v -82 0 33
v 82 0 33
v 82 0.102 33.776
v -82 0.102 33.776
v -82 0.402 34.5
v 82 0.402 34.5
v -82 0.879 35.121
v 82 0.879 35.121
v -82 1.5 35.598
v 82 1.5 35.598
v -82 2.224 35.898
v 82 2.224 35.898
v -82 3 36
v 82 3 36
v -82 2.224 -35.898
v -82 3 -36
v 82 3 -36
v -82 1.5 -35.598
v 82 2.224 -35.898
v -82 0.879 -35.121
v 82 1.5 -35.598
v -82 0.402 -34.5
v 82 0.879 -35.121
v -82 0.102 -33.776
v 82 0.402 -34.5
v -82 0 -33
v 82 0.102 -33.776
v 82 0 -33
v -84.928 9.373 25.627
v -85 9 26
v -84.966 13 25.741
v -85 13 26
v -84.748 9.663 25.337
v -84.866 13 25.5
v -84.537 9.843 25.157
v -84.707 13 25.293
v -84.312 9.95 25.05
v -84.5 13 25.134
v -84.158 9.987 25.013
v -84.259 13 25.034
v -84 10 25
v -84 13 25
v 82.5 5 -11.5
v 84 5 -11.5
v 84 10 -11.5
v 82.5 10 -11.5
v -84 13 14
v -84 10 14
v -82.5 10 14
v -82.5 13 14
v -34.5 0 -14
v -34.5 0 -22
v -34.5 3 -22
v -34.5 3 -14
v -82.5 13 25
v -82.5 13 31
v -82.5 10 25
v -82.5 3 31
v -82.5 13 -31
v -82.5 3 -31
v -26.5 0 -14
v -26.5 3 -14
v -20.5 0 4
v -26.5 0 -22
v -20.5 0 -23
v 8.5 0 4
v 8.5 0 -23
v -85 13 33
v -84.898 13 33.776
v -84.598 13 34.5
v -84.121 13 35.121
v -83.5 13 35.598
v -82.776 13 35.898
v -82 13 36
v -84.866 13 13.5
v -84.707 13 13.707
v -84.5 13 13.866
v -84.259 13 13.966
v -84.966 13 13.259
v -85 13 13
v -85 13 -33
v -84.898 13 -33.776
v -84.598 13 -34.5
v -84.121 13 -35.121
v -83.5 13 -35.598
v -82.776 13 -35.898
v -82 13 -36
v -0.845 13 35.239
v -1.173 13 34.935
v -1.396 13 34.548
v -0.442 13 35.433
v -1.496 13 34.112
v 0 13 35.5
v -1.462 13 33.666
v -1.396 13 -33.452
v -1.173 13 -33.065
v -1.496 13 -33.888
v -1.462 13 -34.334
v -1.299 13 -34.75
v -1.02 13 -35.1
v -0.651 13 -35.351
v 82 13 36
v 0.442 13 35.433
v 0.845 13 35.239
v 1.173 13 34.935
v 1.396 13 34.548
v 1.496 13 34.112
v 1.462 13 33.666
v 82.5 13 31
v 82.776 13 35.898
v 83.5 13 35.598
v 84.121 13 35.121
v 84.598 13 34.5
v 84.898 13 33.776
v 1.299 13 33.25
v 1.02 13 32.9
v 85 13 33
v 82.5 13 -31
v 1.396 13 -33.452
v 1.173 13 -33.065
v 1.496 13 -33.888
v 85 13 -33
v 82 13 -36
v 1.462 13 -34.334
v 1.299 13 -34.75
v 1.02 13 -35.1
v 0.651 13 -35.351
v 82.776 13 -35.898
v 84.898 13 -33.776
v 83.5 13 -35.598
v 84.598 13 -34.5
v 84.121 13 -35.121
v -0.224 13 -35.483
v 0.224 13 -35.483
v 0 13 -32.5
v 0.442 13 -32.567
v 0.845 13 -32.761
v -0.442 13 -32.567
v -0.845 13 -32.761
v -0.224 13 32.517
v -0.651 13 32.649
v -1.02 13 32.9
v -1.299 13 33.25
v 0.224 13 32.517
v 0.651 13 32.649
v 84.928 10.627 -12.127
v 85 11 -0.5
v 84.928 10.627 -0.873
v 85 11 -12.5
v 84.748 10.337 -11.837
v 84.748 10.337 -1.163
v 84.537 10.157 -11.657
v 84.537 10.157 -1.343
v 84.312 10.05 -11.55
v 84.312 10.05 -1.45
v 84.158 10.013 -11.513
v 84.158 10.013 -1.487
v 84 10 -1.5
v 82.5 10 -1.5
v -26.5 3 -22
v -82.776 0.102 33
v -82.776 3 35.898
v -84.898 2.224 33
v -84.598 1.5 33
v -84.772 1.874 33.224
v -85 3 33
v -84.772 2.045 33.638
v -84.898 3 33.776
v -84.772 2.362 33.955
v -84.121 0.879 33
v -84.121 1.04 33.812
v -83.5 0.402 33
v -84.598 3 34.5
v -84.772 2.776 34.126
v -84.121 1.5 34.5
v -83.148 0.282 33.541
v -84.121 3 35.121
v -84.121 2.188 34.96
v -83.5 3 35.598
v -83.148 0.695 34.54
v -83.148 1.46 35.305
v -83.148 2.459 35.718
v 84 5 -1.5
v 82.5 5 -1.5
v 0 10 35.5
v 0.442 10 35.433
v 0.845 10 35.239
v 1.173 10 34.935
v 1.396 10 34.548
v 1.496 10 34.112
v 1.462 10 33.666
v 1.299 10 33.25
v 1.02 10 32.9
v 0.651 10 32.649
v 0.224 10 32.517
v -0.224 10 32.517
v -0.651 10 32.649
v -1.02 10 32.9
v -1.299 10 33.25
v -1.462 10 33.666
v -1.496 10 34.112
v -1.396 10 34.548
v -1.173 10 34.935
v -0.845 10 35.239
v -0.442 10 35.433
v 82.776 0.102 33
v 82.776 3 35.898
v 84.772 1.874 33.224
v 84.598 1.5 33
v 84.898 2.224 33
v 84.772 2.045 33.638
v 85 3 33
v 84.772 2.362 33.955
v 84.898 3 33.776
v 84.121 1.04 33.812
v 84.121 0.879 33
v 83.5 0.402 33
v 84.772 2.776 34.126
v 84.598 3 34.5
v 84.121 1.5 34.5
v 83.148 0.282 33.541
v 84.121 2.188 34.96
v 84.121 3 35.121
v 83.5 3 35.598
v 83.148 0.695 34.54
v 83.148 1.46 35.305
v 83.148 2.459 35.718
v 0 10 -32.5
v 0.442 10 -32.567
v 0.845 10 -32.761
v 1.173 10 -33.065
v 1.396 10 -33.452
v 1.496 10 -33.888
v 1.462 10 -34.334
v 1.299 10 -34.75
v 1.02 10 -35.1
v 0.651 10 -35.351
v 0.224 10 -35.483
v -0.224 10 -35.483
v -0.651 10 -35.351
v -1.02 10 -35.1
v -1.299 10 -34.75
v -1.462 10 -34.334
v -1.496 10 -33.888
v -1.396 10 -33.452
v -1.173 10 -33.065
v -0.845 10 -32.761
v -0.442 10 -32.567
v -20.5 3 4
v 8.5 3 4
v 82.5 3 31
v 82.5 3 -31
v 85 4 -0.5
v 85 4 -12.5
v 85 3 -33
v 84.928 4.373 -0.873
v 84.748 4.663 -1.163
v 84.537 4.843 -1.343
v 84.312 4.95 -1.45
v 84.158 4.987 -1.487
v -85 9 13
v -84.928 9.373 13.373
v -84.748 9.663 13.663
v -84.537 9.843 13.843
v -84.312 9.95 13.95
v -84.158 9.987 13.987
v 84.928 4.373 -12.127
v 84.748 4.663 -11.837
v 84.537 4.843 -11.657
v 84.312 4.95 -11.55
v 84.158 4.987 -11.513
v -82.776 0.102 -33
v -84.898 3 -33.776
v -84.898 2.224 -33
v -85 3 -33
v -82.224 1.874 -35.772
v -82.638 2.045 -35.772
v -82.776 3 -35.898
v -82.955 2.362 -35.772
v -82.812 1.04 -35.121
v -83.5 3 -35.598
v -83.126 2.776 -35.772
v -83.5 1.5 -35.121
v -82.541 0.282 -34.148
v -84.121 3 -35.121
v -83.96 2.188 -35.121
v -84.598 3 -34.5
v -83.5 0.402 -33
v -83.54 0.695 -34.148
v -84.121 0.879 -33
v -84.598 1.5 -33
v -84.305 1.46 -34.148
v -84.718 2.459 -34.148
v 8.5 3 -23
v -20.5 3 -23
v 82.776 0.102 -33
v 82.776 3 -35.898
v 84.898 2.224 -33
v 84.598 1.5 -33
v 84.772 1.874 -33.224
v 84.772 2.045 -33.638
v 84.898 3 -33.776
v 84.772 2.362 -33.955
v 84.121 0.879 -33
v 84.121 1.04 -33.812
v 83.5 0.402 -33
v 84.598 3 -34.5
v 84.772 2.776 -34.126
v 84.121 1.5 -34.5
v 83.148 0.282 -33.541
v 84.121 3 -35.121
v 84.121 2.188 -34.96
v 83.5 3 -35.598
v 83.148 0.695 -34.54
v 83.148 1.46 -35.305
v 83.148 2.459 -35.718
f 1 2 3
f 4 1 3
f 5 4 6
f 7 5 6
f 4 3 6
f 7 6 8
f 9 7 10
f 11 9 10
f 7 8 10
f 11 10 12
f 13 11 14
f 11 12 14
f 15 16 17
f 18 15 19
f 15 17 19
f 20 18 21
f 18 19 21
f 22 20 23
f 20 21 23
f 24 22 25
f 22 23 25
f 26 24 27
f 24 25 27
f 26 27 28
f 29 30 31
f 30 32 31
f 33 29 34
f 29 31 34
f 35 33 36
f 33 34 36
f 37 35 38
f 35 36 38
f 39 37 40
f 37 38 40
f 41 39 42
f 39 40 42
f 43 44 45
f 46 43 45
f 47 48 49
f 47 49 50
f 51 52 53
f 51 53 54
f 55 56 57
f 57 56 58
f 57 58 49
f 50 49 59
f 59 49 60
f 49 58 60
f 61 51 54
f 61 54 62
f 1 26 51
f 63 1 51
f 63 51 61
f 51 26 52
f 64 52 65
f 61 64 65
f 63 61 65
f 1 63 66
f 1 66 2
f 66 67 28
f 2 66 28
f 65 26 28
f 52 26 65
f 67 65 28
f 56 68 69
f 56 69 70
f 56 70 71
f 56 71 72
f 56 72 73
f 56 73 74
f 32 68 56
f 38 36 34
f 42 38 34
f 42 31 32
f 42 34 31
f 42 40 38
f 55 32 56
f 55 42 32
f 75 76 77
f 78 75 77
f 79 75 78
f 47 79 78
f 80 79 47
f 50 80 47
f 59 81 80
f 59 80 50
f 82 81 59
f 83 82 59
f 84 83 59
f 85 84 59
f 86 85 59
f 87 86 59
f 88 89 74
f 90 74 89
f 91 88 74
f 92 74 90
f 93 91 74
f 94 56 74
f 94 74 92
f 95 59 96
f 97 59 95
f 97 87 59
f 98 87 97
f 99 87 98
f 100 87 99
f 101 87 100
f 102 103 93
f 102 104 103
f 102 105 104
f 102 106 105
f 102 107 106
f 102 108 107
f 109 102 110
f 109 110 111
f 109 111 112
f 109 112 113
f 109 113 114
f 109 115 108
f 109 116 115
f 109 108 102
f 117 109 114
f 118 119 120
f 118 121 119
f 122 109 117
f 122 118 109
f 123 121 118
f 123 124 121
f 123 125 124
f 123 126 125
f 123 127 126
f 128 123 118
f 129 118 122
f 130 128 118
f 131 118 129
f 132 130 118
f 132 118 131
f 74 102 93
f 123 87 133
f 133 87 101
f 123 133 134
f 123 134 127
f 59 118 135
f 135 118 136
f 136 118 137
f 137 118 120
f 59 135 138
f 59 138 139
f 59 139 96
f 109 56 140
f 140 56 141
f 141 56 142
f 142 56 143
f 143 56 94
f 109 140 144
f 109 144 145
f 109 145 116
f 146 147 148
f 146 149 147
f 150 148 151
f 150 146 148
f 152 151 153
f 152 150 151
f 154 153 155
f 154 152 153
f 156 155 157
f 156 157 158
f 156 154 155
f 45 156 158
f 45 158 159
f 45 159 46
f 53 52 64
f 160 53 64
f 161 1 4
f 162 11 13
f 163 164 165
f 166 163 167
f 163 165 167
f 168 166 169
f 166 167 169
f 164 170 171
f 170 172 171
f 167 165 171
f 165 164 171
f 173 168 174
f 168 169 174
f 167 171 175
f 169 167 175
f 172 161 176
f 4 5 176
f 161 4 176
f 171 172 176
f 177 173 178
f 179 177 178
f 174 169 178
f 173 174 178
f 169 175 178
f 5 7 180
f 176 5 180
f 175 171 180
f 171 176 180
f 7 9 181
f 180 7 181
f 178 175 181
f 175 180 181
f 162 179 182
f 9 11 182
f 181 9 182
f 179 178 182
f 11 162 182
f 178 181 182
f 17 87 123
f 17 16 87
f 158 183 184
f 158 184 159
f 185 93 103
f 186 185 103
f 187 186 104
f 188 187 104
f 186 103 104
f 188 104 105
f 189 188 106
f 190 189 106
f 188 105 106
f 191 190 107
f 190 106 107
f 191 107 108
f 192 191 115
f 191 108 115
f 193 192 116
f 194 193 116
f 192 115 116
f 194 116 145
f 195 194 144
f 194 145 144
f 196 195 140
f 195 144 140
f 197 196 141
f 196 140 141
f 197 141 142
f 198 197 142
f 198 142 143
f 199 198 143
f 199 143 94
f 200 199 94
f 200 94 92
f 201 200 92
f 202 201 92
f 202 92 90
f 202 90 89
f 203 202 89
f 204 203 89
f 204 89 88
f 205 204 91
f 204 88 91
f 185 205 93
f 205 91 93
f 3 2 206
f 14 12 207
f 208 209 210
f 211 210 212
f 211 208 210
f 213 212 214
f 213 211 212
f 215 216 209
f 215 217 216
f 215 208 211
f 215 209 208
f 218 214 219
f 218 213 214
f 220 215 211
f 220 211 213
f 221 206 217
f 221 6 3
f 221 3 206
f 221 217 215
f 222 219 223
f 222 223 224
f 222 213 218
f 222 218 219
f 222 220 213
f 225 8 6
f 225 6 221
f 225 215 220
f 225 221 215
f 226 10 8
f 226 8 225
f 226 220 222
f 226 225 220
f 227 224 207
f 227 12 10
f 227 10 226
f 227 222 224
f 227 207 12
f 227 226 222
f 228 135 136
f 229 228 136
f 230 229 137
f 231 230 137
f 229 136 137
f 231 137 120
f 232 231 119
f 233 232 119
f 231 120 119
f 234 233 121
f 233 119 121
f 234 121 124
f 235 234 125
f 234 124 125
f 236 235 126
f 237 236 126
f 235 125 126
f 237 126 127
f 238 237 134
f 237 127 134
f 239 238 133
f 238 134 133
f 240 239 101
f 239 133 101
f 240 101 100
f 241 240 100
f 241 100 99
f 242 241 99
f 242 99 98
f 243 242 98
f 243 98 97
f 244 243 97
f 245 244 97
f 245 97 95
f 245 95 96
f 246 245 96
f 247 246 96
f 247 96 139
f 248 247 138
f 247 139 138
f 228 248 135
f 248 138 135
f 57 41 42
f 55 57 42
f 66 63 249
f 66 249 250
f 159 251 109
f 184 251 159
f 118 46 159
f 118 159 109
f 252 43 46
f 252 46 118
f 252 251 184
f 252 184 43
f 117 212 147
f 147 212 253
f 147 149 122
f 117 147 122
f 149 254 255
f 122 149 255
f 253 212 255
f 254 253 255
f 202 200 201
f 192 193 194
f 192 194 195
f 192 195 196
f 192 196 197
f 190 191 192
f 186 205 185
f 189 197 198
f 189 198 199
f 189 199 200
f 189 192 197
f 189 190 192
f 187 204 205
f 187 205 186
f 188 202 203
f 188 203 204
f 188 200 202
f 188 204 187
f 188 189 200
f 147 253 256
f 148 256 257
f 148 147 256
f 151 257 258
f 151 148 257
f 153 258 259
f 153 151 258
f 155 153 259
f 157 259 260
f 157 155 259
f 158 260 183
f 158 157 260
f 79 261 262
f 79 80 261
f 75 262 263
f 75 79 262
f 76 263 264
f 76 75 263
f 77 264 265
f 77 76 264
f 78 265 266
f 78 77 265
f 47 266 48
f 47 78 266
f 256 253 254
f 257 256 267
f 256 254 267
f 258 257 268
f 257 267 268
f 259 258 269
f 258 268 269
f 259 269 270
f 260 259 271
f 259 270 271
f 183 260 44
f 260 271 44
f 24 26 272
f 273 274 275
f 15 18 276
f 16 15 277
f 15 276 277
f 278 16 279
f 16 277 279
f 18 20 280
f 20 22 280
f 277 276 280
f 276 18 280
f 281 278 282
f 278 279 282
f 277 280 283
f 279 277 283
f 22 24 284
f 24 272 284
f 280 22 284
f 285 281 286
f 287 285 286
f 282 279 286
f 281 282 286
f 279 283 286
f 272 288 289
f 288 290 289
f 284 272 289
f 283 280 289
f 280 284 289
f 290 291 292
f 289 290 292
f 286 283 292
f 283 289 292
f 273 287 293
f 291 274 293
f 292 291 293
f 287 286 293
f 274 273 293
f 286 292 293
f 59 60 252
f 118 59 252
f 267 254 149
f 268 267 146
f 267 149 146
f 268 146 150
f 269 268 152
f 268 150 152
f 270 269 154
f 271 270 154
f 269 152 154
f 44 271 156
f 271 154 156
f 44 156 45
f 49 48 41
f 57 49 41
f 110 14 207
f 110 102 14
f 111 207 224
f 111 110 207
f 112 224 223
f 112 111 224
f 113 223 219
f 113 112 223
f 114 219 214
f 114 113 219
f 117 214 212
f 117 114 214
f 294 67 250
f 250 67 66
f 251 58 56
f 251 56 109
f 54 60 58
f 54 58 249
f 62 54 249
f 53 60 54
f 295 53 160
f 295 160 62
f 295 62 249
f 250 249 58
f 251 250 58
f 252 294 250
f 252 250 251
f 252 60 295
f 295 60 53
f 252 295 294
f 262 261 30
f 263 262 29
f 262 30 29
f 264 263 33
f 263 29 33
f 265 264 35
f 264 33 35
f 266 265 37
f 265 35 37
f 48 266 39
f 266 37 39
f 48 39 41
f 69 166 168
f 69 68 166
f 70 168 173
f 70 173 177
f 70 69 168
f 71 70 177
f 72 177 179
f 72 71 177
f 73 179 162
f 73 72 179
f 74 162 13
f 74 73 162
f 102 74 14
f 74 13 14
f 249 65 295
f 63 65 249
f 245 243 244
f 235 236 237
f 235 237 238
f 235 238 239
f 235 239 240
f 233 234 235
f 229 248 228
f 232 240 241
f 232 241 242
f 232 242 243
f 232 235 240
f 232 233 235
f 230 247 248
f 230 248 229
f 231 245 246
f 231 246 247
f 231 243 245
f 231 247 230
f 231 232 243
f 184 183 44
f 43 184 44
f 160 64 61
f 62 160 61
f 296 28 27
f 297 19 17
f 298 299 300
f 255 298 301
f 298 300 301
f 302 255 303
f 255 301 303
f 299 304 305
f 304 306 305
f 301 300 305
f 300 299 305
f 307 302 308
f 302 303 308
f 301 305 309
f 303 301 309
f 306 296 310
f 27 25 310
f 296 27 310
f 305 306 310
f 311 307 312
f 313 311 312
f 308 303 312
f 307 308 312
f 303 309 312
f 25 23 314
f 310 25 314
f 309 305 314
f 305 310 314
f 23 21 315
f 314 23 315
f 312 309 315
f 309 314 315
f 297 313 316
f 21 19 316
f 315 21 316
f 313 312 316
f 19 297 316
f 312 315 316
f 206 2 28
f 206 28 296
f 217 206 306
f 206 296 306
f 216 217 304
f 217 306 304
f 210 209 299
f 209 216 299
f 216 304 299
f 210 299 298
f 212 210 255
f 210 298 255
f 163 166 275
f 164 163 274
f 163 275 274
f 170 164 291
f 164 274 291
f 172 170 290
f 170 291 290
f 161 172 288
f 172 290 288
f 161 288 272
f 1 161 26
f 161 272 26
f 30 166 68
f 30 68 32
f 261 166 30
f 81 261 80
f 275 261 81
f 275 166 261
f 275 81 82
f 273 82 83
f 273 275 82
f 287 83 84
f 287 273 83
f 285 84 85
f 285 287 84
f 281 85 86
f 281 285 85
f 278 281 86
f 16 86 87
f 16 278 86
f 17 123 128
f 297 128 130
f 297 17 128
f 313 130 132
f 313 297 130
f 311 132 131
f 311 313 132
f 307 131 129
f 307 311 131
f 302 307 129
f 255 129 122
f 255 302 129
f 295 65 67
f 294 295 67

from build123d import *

# Parameters (mm, degrees)
SKETCH_1_W          = 170
SKETCH_1_H          = 72
EXTRUDE_1_DEPTH     = 3
SKETCH_2_W          = 170
SKETCH_2_H          = 72
SKETCH_2_W_2        = 165
SKETCH_2_H_2        = 62
EXTRUDE_2_DEPTH     = 10
SKETCH_3_R          = 1.5
CUT_EXTRUDE_1_DEPTH = 3
SKETCH_4_W          = 29
SKETCH_4_H          = 27
SKETCH_4_W_2        = 8
SKETCH_4_H_2        = 8
CUT_EXTRUDE_2_DEPTH = 3
FILLET_1_R          = 3
SKETCH_5_W          = 11
SKETCH_5_H          = 3
CUT_EXTRUDE_3_DEPTH = 3
FILLET_3_R          = 1
SKETCH_6_W          = 10
SKETCH_6_H          = 5
CUT_EXTRUDE_4_DEPTH = 3
FILLET_4_R          = 1


with BuildPart() as part:
    # 草图1 → 凸台-拉伸1 (new body)
    with BuildSketch(Plane(origin=(0, 0, 0), x_dir=(1, 0, 0), z_dir=(0, 1, 0))):
        Rectangle(SKETCH_1_W, SKETCH_1_H)
    extrude(amount=EXTRUDE_1_DEPTH)

    # 草图2 → 凸台-拉伸2 (add)
    with BuildSketch(Plane(origin=(0, 3, 0), x_dir=(1, 0, 0), z_dir=(0, 1, 0))):
        Rectangle(SKETCH_2_W, SKETCH_2_H)
        Rectangle(SKETCH_2_W_2, SKETCH_2_H_2, mode=Mode.SUBTRACT)
    extrude(amount=EXTRUDE_2_DEPTH)

    # 草图3 → 切除-拉伸1 (cut)
    with BuildSketch(Plane(origin=(0, 13, 0), x_dir=(1, 0, 0), z_dir=(0, 1, 0))):
        with Locations(Location((0, 34, 0), (0, 0, 270))):
            Circle(SKETCH_3_R)
        with Locations(Location((0, -34, 0), (0, 0, 270))):
            Circle(SKETCH_3_R)
    extrude(amount=-CUT_EXTRUDE_1_DEPTH, mode=Mode.SUBTRACT)

    # 草图4 → 切除-拉伸2 (cut)
    with BuildSketch(Plane.XZ):
        with Locations((-6, -9.5)):
            Rectangle(SKETCH_4_W, SKETCH_4_H)
        with Locations((-30.5, -18)):
            Rectangle(SKETCH_4_W_2, SKETCH_4_H_2)
    extrude(amount=-CUT_EXTRUDE_2_DEPTH, mode=Mode.SUBTRACT)

    # 圆角1
    fillet_1_edges = [part.edges().sort_by_distance(p)[0] for p in [
        (0, 0, 36),
        (-85, 0, 0),
        (0, 0, -36),
        (85, 0, 0),
        (85, 6.5, 36),
        (-85, 6.5, 36),
        (-85, 6.5, -36),
        (85, 6.5, -36),
    ]]
    fillet(fillet_1_edges, radius=FILLET_1_R)

    # 草图5 → 切除-拉伸3 (cut)
    with BuildSketch(Plane.ZY.offset(85)):
        with Locations((19.5, 11.5)):
            Rectangle(SKETCH_5_W, SKETCH_5_H)
    extrude(amount=-CUT_EXTRUDE_3_DEPTH, mode=Mode.SUBTRACT)

    # 圆角3
    fillet_3_edges = [part.edges().sort_by_distance(p)[0] for p in [
        (-85, 11.5, 14),
        (-85, 10, 19.5),
        (-85, 11.5, 25),
    ]]
    fillet(fillet_3_edges, radius=FILLET_3_R)

    # 草图6 → 切除-拉伸4 (cut)
    with BuildSketch(Plane(origin=(85, 0, 0), x_dir=(0, 0, -1), z_dir=(1, 0, 0))):
        with Locations((6.5, 7.5)):
            Rectangle(SKETCH_6_W, SKETCH_6_H)
    extrude(amount=-CUT_EXTRUDE_4_DEPTH, mode=Mode.SUBTRACT)

    # 圆角4
    fillet_4_edges = [part.edges().sort_by_distance(p)[0] for p in [
        (85, 7.5, -1.5),
        (85, 5, -6.5),
        (85, 7.5, -11.5),
        (85, 10, -6.5),
    ]]
    fillet(fillet_4_edges, radius=FILLET_4_R)


solid = part.part
